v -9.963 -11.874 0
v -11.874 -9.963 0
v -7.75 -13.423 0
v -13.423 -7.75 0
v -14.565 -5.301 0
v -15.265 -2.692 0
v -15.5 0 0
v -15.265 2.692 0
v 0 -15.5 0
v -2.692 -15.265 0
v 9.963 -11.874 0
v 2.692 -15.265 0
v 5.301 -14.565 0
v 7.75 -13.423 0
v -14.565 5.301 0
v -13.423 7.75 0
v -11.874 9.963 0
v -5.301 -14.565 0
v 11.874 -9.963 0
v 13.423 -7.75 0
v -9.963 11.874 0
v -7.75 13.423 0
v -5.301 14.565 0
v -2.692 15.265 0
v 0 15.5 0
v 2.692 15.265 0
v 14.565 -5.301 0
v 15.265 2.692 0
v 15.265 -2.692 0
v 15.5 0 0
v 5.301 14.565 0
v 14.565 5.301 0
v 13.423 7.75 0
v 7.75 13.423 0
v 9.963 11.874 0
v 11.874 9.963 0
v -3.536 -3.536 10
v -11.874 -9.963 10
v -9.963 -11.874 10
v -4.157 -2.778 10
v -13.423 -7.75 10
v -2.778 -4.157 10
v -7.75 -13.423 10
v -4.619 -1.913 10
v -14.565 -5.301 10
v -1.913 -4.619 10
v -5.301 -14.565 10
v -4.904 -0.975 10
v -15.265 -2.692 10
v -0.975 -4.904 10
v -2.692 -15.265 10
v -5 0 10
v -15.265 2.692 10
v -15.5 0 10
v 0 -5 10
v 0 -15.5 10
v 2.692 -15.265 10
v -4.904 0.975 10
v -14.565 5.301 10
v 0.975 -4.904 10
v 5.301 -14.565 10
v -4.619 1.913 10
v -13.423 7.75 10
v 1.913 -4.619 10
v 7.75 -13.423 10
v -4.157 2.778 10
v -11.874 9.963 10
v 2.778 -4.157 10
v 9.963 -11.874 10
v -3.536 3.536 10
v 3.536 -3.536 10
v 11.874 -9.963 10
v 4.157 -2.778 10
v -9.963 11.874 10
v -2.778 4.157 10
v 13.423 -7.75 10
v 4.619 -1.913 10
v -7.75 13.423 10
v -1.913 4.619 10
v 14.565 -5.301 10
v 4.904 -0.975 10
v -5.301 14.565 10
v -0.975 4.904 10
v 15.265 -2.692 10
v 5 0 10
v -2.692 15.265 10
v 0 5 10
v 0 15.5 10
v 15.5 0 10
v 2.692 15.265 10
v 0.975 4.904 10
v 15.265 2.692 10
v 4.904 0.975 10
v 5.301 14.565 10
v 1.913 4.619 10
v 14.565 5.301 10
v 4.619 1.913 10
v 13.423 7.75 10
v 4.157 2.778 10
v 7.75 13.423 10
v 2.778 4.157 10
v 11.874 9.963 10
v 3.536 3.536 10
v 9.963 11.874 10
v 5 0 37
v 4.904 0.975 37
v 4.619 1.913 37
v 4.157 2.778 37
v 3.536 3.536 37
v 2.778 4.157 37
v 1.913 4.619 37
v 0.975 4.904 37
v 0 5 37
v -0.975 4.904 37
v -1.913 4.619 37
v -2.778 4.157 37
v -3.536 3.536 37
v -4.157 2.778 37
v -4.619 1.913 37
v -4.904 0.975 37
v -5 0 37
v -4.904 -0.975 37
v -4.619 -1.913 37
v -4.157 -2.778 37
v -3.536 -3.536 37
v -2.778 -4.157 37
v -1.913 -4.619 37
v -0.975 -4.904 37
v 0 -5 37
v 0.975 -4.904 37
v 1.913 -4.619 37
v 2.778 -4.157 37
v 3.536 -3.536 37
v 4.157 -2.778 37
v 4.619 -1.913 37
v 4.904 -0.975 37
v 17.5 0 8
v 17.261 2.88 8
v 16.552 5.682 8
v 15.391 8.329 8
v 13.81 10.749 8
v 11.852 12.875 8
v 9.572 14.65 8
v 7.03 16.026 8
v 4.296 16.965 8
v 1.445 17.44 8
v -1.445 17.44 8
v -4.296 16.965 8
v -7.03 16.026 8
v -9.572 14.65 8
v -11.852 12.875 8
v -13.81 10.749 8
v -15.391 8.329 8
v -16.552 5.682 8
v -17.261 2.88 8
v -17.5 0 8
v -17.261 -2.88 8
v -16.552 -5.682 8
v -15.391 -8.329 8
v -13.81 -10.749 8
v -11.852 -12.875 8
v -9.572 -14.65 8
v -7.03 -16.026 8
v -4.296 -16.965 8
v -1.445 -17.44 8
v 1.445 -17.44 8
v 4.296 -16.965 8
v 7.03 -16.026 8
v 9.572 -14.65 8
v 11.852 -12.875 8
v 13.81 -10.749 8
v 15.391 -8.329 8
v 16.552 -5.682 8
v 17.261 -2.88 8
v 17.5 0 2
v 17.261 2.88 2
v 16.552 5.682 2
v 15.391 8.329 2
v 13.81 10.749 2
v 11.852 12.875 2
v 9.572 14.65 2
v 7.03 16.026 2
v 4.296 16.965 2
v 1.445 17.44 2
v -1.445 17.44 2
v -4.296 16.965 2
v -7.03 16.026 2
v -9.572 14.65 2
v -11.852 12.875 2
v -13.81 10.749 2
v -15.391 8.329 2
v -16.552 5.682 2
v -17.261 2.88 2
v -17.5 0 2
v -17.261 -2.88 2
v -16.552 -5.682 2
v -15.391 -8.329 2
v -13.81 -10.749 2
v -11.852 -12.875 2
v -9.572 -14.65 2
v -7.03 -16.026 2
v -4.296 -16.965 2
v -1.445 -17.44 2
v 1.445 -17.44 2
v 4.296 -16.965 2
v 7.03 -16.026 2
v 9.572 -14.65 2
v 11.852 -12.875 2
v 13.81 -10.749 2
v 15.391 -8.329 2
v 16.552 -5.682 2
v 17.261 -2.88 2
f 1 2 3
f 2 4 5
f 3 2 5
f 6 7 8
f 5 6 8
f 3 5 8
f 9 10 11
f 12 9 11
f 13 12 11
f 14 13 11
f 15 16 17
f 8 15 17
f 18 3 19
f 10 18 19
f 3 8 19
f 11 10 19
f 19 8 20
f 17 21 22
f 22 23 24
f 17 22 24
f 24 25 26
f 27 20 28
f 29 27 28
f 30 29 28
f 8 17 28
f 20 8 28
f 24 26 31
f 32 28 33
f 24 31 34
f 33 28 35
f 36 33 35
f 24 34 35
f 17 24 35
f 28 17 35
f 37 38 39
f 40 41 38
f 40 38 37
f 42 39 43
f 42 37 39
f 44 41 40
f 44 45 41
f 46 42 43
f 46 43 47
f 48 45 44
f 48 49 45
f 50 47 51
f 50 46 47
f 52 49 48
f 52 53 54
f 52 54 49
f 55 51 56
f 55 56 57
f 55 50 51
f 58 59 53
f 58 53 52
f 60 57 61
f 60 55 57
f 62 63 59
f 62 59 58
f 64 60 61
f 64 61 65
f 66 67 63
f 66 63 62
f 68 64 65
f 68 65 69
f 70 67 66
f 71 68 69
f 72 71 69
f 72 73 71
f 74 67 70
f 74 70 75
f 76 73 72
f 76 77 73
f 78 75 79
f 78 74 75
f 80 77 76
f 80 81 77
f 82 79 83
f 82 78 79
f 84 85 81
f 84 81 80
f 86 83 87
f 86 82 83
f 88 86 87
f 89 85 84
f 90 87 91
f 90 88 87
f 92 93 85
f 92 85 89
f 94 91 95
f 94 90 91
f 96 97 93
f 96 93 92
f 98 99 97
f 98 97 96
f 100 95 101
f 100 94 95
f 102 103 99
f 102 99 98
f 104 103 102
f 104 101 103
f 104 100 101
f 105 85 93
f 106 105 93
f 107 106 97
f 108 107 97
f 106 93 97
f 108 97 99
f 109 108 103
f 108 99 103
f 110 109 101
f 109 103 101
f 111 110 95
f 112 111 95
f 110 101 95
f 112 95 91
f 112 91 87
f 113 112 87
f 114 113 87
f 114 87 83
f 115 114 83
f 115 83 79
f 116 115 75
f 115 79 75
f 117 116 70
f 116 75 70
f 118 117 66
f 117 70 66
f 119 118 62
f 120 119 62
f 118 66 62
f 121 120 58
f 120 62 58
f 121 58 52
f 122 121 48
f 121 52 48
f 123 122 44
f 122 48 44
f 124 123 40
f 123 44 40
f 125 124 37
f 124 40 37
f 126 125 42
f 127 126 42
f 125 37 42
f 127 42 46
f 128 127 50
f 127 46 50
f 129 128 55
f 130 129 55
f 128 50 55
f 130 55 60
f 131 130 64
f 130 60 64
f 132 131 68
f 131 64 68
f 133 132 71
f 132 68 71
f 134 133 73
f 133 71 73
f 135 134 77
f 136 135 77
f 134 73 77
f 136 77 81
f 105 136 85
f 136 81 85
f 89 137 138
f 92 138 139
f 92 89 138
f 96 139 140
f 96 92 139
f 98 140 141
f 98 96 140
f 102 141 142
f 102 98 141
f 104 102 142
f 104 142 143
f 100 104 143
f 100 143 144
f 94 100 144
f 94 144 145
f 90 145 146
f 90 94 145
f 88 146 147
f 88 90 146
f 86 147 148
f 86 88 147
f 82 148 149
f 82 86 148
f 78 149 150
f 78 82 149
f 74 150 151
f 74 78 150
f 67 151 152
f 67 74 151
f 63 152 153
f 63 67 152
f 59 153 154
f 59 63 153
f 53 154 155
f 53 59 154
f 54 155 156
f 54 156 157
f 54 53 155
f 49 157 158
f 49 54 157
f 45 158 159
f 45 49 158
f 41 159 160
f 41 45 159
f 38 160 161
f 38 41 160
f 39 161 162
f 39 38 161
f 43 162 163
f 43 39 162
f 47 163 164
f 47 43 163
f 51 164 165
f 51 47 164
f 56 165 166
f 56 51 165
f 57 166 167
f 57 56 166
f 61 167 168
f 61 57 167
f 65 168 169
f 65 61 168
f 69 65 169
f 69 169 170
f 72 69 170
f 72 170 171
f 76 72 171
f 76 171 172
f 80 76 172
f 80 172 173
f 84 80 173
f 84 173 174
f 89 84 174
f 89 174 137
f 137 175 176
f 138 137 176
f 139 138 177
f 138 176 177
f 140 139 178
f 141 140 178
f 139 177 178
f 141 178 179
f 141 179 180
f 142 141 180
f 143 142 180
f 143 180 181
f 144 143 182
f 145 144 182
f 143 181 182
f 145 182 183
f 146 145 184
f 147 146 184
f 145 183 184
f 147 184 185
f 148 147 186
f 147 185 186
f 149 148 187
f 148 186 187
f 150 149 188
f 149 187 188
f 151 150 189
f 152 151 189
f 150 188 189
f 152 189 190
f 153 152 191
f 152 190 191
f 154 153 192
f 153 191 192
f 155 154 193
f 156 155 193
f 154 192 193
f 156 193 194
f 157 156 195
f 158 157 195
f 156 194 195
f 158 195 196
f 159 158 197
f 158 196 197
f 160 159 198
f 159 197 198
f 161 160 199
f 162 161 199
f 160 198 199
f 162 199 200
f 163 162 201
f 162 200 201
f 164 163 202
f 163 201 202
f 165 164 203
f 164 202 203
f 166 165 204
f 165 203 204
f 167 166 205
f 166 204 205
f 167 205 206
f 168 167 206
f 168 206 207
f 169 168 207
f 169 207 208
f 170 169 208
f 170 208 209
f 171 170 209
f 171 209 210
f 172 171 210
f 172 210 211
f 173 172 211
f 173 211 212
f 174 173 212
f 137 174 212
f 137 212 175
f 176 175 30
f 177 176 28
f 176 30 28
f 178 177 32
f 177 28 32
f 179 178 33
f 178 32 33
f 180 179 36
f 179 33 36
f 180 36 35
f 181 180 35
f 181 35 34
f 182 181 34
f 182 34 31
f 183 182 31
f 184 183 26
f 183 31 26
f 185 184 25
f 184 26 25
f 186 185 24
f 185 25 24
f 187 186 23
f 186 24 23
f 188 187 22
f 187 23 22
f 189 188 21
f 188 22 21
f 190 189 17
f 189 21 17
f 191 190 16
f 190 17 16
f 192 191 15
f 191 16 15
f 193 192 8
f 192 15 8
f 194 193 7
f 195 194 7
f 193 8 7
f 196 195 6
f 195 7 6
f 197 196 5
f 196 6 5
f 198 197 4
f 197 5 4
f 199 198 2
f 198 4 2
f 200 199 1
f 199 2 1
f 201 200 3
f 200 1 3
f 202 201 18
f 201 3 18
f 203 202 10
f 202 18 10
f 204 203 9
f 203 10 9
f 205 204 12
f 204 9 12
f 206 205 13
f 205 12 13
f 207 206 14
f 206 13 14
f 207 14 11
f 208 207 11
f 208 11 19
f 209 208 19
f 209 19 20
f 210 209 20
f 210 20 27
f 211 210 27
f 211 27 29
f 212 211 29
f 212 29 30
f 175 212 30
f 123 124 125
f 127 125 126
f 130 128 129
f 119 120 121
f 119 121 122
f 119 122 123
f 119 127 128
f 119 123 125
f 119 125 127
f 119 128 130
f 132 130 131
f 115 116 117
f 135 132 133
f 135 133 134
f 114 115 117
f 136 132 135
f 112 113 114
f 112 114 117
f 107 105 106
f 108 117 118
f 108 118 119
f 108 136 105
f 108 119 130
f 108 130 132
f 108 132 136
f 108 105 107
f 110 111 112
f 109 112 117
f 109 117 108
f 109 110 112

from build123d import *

# Parameters (mm, degrees)
F0_R     = 17.5
F1_DEPTH = 10
F2_R     = 5
F3_DEPTH = 27
F4_SIZE  = 2


with BuildPart() as f1:
    # F0 (on Top) → F1 (new body)
    with BuildSketch(Plane.XY):
        Circle(F0_R)
    extrude(amount=F1_DEPTH)

    # F2 (on face) → F3 (join)
    with BuildSketch(Plane.XY.offset(10)):
        Circle(F2_R)
    extrude(amount=F3_DEPTH)

    # F4
    f4_edges = [f1.edges().sort_by_distance(p)[0] for p in [
        (-17.5, 0, 10),
        (-17.5, 0, 0),
    ]]
    chamfer(f4_edges, length=F4_SIZE)


solid = f1.part
